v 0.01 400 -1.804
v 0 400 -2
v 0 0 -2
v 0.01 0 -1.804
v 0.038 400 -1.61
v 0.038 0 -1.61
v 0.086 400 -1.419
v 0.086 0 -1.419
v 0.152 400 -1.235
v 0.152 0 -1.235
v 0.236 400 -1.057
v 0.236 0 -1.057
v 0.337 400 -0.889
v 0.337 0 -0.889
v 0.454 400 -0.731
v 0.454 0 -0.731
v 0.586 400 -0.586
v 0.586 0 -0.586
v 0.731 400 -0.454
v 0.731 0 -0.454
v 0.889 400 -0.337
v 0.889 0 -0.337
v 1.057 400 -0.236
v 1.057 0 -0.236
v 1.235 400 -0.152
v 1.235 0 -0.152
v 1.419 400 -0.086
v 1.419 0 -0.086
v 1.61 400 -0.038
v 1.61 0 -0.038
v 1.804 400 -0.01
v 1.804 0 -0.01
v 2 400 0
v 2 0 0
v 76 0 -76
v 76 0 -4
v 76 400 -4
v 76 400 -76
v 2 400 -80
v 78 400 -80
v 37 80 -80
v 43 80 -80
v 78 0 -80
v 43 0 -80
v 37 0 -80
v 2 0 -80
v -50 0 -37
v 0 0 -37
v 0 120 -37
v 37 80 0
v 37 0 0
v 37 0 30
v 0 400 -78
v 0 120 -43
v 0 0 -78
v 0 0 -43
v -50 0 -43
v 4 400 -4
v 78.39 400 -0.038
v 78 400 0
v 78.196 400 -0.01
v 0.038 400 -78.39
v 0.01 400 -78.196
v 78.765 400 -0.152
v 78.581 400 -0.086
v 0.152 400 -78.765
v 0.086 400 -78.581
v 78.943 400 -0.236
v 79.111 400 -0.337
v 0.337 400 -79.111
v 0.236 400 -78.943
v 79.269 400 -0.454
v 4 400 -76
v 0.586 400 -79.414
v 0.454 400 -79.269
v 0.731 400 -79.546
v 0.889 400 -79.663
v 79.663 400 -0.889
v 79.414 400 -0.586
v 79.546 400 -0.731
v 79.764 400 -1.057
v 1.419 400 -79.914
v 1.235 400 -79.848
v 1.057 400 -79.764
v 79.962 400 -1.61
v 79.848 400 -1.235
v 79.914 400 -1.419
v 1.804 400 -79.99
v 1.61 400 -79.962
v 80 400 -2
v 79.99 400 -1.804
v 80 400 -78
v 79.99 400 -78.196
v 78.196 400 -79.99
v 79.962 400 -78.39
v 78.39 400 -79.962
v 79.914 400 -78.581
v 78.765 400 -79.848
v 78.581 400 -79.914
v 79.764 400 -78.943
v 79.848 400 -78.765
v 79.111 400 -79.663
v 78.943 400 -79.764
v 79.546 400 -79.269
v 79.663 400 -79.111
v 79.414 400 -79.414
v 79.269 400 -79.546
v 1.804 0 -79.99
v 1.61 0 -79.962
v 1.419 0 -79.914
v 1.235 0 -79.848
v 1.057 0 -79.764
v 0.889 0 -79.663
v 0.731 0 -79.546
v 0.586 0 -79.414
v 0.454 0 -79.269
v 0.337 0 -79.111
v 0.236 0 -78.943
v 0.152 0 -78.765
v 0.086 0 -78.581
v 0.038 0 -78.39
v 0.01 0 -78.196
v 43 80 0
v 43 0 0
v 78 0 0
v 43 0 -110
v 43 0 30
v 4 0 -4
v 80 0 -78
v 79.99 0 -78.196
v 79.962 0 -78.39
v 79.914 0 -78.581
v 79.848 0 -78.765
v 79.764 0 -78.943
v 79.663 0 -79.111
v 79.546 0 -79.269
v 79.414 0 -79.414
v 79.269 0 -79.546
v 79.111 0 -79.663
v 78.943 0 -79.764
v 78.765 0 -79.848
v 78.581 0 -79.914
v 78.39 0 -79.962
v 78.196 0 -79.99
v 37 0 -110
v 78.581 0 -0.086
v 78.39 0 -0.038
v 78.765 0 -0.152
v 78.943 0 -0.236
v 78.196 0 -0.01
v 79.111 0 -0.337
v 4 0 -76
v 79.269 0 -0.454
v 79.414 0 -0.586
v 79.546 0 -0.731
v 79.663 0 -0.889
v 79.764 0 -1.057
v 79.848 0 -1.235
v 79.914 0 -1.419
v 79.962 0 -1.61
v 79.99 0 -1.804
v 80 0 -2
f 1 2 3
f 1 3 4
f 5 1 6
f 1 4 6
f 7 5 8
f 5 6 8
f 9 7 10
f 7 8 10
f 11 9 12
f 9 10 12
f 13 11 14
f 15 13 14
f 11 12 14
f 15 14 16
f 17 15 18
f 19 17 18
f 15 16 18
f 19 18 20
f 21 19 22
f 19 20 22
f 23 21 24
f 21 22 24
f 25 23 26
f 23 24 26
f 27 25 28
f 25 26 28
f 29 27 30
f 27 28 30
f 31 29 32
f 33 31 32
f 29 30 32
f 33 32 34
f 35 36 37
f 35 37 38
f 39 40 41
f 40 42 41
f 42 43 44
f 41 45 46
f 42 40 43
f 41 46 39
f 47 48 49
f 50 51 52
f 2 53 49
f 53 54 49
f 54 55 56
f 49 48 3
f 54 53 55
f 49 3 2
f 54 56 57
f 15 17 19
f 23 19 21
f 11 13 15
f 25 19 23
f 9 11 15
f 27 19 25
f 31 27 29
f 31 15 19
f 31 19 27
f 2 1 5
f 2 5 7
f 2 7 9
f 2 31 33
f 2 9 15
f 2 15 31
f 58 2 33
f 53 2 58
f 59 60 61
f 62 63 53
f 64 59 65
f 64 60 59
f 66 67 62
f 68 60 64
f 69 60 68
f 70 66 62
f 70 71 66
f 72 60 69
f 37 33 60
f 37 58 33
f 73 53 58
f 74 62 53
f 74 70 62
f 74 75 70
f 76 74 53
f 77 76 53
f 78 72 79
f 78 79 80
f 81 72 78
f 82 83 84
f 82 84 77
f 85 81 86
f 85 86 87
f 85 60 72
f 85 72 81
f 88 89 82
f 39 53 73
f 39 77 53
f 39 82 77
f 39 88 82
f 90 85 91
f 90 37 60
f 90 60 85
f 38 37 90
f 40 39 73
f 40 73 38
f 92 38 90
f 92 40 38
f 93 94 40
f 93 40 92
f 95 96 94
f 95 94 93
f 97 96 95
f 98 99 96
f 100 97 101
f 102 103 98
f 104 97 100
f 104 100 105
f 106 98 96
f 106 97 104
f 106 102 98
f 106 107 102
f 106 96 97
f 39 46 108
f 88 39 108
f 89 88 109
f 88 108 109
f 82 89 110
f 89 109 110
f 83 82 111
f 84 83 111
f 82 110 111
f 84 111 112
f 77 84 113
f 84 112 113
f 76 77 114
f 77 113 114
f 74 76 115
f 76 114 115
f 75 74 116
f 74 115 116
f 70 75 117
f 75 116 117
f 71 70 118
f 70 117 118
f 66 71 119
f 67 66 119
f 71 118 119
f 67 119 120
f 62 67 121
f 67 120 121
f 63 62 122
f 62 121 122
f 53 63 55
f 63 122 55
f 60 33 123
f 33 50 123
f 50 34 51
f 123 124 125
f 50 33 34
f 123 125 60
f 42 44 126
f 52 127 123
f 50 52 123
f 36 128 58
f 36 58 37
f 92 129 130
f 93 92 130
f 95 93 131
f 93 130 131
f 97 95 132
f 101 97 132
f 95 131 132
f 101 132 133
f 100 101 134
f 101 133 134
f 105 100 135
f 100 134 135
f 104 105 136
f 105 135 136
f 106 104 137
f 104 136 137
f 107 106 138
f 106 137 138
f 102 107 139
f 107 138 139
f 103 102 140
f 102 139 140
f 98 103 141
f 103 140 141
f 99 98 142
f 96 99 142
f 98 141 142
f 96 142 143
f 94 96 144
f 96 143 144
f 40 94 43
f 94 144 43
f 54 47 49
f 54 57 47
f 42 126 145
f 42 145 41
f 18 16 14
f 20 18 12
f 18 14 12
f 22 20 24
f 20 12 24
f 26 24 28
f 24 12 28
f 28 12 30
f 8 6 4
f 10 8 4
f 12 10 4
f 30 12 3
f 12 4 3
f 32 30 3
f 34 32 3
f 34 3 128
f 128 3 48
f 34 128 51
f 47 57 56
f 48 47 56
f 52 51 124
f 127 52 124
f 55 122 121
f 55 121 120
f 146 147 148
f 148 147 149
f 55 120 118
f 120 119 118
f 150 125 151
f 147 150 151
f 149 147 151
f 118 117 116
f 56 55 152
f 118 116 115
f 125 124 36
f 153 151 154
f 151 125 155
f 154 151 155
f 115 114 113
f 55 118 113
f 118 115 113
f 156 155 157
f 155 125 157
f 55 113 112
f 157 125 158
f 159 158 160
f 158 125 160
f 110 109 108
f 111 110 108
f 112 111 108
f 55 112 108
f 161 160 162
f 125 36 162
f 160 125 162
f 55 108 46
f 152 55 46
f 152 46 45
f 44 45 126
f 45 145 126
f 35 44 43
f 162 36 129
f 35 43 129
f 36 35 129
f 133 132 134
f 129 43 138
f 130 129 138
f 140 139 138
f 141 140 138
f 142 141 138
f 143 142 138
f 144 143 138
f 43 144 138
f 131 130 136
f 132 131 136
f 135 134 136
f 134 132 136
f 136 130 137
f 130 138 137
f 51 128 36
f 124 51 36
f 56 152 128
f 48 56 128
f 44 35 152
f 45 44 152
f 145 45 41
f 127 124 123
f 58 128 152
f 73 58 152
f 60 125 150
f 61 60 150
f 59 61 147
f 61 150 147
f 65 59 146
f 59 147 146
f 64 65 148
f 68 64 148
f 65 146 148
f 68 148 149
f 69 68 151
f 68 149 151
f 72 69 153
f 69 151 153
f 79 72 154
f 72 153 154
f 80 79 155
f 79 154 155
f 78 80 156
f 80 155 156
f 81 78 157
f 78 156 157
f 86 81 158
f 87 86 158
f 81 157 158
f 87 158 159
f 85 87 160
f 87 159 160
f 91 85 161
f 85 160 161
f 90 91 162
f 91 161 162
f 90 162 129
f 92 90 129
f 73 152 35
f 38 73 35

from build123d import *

# Parameters (mm, degrees)
SKETCH1_W           = 72
SKETCH1_H           = 72
BOSS_EXTRUDE1_DEPTH = 400
RIB2_START          = -3
RIB2_DEPTH          = 6
BOSS_EXTRUDE2_DEPTH = 3


# Read off the part's stored shape, not the designer's step: Rib2
with BuildPart() as part:
    # Sketch1 → Boss-Extrude1 (new body)
    with BuildSketch(Plane(origin=(0, 0, 0), x_dir=(1, 0, 0), z_dir=(0, 1, 0))):
        with BuildLine():
            Line((2, 0), (78, 0))
            ThreePointArc((78, 0), (79.414213562, 0.585786438), (80, 2))
            Line((80, 2), (80, 78))
            ThreePointArc((80, 78), (79.414213562, 79.414213562), (78, 80))
            Line((78, 80), (2, 80))
            ThreePointArc((2, 80), (0.585786438, 79.414213562), (0, 78))
            Line((0, 78), (0, 2))
            ThreePointArc((0, 2), (0.585786438, 0.585786438), (2, 0))
        make_face()
        with Locations((40, 40)):
            Rectangle(SKETCH1_W, SKETCH1_H, mode=Mode.SUBTRACT)
    extrude(amount=BOSS_EXTRUDE1_DEPTH)

    # Rib2 outline → Rib2 (add)
    with BuildSketch(Plane.ZY.offset(-40).offset(RIB2_START)):
        Polygon((0, 80), (0, 0), (30, 0), align=None)
    rib2 = extrude(amount=RIB2_DEPTH)

    # Mirror1: Rib2 across plane
    add(rib2.mirror(Plane(origin=(0, 0, -40), x_dir=(1, 0, 0), z_dir=(0, 0, -1))))

    # Sketch4 → Boss-Extrude2 (add, symmetric)
    with BuildSketch(Plane(origin=(0, 0, -40), x_dir=(-1, 0, 0), z_dir=(0, 0, -1))):
        Polygon((50, 0), (0, 120), (0, 0), align=None)
    extrude(amount=BOSS_EXTRUDE2_DEPTH, both=True)


solid = part.part
